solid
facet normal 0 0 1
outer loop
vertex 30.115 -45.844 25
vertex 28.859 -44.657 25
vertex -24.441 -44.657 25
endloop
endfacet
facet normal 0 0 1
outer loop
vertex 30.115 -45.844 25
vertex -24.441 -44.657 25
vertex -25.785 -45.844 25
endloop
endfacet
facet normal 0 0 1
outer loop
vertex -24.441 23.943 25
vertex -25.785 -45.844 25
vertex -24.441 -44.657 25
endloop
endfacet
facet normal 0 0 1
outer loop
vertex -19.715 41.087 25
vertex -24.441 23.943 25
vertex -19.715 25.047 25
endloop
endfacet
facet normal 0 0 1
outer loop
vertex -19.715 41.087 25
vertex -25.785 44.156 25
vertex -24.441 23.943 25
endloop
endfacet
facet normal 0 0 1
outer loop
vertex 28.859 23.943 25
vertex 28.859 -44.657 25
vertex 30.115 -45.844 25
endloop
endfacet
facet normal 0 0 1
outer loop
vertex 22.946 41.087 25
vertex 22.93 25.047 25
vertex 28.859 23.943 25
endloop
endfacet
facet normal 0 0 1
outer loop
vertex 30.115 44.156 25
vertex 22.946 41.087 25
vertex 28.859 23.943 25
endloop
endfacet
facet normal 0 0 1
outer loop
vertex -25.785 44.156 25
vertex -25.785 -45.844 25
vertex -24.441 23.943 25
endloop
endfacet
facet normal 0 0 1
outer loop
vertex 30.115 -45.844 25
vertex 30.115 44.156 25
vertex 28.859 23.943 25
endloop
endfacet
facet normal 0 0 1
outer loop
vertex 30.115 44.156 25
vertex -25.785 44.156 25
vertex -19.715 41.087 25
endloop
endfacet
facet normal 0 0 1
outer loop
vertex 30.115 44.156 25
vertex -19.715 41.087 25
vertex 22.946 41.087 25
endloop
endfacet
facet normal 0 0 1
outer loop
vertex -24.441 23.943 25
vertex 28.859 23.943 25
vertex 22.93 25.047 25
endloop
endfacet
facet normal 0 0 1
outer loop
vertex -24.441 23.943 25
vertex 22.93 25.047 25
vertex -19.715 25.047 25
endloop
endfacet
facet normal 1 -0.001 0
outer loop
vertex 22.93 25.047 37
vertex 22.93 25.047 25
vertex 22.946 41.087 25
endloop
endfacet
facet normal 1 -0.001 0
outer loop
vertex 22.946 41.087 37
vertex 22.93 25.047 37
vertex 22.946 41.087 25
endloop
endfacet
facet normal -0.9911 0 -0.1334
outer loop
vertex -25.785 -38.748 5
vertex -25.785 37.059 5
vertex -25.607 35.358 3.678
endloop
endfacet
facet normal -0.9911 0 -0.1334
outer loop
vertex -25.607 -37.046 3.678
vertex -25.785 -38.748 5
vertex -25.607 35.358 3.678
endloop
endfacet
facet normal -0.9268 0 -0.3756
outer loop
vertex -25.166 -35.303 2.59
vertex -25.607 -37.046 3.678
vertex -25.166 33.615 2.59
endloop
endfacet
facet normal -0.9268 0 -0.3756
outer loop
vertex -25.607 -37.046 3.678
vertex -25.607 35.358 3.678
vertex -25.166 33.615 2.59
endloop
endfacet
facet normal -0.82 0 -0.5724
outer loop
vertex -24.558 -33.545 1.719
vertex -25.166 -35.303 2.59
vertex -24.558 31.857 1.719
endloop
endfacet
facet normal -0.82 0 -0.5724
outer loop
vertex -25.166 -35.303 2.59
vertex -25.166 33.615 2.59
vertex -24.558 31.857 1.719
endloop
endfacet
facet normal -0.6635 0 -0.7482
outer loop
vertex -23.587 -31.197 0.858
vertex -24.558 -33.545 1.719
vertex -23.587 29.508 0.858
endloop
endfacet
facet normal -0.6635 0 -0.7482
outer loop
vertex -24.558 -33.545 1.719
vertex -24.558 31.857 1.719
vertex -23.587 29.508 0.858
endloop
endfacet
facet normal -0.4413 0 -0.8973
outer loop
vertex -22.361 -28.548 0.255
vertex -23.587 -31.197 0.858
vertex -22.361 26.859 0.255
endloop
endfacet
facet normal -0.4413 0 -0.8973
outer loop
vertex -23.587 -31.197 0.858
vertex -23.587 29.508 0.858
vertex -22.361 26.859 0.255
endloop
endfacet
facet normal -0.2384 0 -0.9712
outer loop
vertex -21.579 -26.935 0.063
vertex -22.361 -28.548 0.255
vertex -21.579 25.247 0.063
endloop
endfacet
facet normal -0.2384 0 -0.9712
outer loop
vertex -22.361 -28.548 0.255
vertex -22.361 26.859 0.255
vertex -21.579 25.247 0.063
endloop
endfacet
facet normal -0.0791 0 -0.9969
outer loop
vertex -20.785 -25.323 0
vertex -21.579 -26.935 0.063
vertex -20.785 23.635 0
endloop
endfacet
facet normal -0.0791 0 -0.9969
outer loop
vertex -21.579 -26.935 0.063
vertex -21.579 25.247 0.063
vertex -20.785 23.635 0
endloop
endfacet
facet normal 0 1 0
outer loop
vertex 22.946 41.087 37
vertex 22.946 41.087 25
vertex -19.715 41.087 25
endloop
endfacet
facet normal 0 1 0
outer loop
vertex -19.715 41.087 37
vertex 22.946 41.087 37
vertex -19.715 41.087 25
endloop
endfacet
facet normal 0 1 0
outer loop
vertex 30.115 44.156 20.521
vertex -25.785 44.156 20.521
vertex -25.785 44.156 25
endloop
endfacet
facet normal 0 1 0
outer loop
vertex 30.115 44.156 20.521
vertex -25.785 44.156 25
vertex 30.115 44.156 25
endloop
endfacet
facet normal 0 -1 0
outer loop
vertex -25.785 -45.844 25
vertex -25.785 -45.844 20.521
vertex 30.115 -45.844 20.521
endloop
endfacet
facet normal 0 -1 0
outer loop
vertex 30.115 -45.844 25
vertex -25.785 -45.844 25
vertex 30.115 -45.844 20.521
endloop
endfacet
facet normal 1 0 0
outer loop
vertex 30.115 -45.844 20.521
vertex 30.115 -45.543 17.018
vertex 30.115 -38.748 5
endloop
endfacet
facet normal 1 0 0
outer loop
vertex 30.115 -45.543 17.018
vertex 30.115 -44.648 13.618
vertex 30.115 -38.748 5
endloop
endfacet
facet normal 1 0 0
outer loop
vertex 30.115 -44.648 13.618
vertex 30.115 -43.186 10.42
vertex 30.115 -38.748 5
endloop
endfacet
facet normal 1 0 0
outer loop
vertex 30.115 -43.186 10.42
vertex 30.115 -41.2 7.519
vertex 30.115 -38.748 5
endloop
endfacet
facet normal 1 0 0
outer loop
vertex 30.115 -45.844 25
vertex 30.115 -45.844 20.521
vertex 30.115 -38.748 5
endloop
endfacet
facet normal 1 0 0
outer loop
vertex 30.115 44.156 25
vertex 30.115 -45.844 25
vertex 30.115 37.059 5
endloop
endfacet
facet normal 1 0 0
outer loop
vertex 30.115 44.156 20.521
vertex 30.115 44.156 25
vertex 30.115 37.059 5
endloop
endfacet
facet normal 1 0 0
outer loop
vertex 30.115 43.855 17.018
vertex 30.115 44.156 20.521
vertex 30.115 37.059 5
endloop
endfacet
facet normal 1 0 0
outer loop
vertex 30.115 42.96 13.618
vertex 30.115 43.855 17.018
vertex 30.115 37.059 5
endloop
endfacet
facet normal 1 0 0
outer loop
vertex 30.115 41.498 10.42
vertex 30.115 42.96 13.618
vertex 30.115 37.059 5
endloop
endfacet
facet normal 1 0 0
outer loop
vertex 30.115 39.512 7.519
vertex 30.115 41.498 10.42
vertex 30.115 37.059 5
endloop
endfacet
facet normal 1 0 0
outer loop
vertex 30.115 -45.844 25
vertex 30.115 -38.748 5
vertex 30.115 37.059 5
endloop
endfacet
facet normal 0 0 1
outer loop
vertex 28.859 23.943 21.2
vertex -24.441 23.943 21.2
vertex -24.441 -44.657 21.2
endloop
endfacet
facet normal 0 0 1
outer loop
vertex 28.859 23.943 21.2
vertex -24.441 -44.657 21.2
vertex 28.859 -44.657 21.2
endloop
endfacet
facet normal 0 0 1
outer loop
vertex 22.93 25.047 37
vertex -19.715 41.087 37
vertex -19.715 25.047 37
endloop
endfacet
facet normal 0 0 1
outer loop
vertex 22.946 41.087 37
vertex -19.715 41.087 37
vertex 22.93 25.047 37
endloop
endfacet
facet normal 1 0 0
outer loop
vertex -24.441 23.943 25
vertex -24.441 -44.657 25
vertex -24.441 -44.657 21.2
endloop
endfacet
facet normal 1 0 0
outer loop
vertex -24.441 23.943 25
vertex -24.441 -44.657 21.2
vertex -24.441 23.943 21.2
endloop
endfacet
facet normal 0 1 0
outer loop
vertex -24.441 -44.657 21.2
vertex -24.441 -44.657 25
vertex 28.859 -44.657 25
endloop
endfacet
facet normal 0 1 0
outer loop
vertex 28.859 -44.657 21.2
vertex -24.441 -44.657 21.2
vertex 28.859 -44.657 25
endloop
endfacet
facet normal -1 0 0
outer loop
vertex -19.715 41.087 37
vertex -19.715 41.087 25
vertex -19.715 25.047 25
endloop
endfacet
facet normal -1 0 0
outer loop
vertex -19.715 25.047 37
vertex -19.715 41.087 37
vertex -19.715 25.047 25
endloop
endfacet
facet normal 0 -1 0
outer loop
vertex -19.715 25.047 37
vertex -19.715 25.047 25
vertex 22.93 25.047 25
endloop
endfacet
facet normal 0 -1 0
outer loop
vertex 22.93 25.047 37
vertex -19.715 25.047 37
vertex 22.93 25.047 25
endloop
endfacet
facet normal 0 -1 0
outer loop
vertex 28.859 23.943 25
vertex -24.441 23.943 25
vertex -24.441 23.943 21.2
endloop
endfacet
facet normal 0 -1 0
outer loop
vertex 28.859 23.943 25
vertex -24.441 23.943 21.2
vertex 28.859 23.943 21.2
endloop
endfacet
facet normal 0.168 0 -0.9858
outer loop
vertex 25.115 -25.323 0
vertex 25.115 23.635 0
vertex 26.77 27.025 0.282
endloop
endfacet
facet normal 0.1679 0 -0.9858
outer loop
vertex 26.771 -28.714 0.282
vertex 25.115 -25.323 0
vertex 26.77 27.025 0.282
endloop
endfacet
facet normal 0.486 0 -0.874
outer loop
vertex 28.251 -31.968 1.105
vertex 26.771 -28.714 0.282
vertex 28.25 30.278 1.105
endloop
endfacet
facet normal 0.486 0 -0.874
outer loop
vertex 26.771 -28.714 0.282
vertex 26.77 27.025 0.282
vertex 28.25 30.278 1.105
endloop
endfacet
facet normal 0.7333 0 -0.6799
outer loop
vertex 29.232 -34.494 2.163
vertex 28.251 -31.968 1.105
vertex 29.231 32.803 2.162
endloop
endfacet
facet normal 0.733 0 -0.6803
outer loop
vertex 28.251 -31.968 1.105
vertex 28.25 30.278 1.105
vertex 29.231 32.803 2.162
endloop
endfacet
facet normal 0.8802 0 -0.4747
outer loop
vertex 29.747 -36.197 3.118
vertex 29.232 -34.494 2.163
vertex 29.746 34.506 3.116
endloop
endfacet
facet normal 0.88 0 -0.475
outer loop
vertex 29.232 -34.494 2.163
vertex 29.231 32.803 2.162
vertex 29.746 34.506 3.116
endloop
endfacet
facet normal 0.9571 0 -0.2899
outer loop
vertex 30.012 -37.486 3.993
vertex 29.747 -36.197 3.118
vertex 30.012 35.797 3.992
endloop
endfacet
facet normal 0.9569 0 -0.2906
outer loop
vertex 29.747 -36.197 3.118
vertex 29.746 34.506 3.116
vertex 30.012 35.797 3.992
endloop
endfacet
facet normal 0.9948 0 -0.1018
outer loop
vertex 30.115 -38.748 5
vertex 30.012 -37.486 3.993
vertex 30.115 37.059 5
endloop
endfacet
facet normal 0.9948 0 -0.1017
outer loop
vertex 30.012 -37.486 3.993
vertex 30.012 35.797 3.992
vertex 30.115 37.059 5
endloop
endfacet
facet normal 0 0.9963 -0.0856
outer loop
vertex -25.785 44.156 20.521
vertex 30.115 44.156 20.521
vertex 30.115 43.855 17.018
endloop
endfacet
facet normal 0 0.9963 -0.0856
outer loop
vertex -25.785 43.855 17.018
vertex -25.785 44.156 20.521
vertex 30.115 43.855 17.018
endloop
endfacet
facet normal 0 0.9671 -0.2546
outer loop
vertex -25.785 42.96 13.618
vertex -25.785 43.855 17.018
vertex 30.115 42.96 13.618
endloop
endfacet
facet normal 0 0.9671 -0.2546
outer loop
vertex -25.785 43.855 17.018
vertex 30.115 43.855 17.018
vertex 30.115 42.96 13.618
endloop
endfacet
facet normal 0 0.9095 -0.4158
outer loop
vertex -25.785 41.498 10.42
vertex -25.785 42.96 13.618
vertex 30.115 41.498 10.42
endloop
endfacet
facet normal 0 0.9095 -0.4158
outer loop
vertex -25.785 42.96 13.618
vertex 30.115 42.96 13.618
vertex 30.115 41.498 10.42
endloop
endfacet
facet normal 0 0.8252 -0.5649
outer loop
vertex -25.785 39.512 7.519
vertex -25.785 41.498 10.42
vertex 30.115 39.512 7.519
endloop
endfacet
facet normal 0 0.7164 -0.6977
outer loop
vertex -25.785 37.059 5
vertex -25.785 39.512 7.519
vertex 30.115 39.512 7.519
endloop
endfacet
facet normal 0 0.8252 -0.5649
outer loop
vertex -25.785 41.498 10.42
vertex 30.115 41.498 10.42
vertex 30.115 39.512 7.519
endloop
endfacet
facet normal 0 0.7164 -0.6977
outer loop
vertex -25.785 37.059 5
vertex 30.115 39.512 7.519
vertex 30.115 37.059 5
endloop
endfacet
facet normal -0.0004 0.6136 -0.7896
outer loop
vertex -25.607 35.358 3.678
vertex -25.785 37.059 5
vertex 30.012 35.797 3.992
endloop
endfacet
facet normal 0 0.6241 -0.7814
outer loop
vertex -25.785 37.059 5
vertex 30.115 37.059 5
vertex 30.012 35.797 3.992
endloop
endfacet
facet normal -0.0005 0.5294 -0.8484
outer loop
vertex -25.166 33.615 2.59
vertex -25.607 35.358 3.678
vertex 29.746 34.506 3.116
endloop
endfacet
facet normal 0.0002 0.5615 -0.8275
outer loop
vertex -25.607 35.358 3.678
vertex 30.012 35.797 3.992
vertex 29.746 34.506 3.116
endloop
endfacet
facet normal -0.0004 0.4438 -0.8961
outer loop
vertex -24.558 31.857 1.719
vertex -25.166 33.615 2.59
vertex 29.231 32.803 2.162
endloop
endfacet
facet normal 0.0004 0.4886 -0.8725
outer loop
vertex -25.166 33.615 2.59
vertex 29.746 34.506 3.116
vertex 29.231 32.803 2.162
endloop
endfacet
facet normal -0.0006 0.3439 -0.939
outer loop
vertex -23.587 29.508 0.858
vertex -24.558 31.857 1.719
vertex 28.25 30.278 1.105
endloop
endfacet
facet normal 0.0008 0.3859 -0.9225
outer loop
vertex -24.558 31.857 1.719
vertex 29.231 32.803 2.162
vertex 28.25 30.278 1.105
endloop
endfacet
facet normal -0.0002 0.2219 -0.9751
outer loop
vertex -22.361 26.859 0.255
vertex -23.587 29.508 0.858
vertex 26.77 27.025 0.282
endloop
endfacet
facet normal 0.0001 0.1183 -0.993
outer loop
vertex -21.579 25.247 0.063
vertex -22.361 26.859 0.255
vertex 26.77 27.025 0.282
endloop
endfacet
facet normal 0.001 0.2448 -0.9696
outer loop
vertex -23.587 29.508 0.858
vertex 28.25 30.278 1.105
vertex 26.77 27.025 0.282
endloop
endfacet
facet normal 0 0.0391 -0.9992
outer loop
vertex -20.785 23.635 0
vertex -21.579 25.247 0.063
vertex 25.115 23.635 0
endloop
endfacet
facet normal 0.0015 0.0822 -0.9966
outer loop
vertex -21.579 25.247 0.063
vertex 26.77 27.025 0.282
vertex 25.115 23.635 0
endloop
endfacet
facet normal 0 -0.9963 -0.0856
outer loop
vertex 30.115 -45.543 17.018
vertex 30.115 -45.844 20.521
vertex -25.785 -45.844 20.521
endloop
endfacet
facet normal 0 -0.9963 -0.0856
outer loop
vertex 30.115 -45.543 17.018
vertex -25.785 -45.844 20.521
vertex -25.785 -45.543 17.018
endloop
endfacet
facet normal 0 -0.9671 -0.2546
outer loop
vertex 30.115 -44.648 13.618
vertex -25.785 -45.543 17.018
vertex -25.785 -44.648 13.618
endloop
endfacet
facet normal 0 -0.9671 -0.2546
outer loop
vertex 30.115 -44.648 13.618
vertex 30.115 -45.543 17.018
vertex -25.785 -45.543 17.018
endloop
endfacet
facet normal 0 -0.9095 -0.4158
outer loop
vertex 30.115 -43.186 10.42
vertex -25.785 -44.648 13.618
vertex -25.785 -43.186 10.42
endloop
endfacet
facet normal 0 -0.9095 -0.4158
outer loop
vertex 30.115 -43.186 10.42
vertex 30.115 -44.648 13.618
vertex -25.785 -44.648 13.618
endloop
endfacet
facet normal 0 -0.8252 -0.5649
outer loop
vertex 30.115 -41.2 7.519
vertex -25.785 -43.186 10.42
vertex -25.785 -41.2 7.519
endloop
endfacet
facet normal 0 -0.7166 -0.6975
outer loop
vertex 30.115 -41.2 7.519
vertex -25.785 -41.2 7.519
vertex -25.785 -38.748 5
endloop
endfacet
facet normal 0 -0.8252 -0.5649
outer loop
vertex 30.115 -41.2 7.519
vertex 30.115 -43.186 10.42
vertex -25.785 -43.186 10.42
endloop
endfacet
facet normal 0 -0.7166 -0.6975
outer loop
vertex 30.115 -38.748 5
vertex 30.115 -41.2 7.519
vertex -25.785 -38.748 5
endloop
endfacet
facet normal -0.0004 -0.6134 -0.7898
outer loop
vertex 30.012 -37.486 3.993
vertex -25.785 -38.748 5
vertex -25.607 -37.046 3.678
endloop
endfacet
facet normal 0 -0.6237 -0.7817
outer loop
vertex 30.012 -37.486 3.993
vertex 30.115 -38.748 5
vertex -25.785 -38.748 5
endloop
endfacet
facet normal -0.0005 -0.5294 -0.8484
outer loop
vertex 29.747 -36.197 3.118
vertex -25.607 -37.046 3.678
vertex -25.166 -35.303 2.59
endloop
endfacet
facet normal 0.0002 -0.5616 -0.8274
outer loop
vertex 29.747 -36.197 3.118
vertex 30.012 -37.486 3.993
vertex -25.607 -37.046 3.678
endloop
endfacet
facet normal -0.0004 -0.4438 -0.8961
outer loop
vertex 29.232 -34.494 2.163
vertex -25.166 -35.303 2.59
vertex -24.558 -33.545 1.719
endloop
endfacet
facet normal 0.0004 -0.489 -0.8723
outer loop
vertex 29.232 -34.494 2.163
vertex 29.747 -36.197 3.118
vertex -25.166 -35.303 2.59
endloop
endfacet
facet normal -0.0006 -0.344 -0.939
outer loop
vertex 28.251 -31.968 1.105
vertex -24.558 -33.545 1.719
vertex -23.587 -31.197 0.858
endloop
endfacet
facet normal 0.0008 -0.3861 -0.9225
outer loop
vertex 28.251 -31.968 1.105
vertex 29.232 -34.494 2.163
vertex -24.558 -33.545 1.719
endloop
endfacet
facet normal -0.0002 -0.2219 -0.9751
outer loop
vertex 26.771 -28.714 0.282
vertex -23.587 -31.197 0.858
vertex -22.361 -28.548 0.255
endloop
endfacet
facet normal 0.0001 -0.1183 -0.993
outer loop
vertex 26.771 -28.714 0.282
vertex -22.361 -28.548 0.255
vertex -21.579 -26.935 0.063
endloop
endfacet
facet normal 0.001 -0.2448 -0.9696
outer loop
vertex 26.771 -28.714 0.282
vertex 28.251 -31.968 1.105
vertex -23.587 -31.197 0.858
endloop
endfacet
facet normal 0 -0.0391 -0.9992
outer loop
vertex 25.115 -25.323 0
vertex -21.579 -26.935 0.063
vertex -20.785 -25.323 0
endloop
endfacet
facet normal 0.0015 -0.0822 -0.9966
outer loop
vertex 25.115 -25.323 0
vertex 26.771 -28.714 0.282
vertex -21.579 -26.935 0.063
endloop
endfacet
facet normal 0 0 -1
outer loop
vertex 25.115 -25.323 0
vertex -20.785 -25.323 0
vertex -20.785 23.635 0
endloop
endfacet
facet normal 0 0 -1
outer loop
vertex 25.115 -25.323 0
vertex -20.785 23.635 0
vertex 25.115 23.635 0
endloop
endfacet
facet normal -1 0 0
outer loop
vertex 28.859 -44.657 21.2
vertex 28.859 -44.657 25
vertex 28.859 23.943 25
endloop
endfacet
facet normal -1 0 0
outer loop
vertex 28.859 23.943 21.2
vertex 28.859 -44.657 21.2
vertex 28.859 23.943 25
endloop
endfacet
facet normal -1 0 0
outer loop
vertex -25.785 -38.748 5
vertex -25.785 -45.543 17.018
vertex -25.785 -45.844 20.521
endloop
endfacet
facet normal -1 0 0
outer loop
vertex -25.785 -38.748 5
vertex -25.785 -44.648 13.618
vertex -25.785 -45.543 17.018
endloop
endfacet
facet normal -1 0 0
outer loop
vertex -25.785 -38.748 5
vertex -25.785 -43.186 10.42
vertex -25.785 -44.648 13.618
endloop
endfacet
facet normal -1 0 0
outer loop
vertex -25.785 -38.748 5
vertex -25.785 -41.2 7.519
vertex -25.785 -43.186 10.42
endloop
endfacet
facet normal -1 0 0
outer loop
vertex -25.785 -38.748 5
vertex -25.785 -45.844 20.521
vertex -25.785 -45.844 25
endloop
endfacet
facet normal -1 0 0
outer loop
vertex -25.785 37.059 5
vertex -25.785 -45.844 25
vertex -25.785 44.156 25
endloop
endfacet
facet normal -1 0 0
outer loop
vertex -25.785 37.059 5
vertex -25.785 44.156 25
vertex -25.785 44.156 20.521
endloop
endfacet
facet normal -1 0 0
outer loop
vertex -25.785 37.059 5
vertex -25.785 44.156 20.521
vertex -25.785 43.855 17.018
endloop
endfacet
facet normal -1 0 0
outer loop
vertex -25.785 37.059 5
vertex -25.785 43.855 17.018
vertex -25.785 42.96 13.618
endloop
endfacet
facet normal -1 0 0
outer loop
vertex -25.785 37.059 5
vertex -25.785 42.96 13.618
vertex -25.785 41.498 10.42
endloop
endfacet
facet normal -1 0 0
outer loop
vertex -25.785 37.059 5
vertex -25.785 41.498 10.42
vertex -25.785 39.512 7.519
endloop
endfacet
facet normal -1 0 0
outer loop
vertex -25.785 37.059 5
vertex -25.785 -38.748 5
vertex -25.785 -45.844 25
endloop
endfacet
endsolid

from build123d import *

# Parameters (mm, degrees)
F0_W        = 55.9
F0_H        = 90
F1_DEPTH    = 25
F2_R        = 20.5208152802
F3_W        = 53.3
F3_H        = 68.6
F4_DEPTH    = 3.8
F5_T1_DEPTH = 91.4583694397
F6_T1_DEPTH = 91.4583694397
F8_DEPTH    = 12


# Not quite as in the source:
# - a fillet or chamfer that OpenCascade refuses, or shapes differently, is made with other operations: its cross-section is extruded or revolved along the edge and cut away or added


with BuildPart() as f1:
    # F0 (on Top) → F1 (new body)
    with BuildSketch(Plane.XY):
        with Locations((2.1647780098, -0.8441807004)):
            Rectangle(F0_W, F0_H)
    extrude(amount=F1_DEPTH)

    # F2
    f2_edges = [f1.edges().sort_by_distance(p)[0] for p in [
        (2.164778, -45.844181, 0),
        (2.164778, 44.155819, 0),
    ]]
    fillet(f2_edges, radius=F2_R)

    # F3 (on face) → F4 (cut)
    with BuildSketch(Plane.XY.offset(25)):
        with Locations((2.2094916642, -10.3566651821)):
            Rectangle(F3_W, F3_H)
    extrude(amount=-F4_DEPTH, mode=Mode.SUBTRACT)

    # F5: fillet of radius 5 on 1 edges, made by hand

    # F5_s2 → F5_t1 (cut)
    with BuildSketch(Plane.XZ.offset(-44.8850040195)):
        with BuildLine():
            ThreePointArc((25.1147780098, 0), (28.6503119157, 1.4644660941), (30.1147780098, 5))
            Line((30.1147780098, 5), (30.1147780098, 0))
            Line((30.1147780098, 0), (25.1147780098, 0))
        make_face()
    extrude(amount=F5_T1_DEPTH, mode=Mode.SUBTRACT)

    # F6: fillet of radius 5 on 1 edges, made by hand

    # F6_s2 → F6_t1 (cut)
    with BuildSketch(Plane.XZ.offset(-44.8850040195)):
        with BuildLine():
            ThreePointArc((-25.7852219902, 5), (-24.3207558961, 1.4644660941), (-20.7852219902, 0))
            Line((-20.7852219902, 0), (-25.7852219902, 0))
            Line((-25.7852219902, 0), (-25.7852219902, 5))
        make_face()
    extrude(amount=F6_T1_DEPTH, mode=Mode.SUBTRACT)

    # F7 (on face) → F8 (join)
    with BuildSketch(Plane.XY.offset(25)):
        Polygon((22.9460150003, 41.0868413746), (-19.7153221816, 41.0868413746), (-19.7153221816, 25.0466242433), (22.930214506, 25.0466242433), align=None)
    extrude(amount=F8_DEPTH)


solid = f1.part
